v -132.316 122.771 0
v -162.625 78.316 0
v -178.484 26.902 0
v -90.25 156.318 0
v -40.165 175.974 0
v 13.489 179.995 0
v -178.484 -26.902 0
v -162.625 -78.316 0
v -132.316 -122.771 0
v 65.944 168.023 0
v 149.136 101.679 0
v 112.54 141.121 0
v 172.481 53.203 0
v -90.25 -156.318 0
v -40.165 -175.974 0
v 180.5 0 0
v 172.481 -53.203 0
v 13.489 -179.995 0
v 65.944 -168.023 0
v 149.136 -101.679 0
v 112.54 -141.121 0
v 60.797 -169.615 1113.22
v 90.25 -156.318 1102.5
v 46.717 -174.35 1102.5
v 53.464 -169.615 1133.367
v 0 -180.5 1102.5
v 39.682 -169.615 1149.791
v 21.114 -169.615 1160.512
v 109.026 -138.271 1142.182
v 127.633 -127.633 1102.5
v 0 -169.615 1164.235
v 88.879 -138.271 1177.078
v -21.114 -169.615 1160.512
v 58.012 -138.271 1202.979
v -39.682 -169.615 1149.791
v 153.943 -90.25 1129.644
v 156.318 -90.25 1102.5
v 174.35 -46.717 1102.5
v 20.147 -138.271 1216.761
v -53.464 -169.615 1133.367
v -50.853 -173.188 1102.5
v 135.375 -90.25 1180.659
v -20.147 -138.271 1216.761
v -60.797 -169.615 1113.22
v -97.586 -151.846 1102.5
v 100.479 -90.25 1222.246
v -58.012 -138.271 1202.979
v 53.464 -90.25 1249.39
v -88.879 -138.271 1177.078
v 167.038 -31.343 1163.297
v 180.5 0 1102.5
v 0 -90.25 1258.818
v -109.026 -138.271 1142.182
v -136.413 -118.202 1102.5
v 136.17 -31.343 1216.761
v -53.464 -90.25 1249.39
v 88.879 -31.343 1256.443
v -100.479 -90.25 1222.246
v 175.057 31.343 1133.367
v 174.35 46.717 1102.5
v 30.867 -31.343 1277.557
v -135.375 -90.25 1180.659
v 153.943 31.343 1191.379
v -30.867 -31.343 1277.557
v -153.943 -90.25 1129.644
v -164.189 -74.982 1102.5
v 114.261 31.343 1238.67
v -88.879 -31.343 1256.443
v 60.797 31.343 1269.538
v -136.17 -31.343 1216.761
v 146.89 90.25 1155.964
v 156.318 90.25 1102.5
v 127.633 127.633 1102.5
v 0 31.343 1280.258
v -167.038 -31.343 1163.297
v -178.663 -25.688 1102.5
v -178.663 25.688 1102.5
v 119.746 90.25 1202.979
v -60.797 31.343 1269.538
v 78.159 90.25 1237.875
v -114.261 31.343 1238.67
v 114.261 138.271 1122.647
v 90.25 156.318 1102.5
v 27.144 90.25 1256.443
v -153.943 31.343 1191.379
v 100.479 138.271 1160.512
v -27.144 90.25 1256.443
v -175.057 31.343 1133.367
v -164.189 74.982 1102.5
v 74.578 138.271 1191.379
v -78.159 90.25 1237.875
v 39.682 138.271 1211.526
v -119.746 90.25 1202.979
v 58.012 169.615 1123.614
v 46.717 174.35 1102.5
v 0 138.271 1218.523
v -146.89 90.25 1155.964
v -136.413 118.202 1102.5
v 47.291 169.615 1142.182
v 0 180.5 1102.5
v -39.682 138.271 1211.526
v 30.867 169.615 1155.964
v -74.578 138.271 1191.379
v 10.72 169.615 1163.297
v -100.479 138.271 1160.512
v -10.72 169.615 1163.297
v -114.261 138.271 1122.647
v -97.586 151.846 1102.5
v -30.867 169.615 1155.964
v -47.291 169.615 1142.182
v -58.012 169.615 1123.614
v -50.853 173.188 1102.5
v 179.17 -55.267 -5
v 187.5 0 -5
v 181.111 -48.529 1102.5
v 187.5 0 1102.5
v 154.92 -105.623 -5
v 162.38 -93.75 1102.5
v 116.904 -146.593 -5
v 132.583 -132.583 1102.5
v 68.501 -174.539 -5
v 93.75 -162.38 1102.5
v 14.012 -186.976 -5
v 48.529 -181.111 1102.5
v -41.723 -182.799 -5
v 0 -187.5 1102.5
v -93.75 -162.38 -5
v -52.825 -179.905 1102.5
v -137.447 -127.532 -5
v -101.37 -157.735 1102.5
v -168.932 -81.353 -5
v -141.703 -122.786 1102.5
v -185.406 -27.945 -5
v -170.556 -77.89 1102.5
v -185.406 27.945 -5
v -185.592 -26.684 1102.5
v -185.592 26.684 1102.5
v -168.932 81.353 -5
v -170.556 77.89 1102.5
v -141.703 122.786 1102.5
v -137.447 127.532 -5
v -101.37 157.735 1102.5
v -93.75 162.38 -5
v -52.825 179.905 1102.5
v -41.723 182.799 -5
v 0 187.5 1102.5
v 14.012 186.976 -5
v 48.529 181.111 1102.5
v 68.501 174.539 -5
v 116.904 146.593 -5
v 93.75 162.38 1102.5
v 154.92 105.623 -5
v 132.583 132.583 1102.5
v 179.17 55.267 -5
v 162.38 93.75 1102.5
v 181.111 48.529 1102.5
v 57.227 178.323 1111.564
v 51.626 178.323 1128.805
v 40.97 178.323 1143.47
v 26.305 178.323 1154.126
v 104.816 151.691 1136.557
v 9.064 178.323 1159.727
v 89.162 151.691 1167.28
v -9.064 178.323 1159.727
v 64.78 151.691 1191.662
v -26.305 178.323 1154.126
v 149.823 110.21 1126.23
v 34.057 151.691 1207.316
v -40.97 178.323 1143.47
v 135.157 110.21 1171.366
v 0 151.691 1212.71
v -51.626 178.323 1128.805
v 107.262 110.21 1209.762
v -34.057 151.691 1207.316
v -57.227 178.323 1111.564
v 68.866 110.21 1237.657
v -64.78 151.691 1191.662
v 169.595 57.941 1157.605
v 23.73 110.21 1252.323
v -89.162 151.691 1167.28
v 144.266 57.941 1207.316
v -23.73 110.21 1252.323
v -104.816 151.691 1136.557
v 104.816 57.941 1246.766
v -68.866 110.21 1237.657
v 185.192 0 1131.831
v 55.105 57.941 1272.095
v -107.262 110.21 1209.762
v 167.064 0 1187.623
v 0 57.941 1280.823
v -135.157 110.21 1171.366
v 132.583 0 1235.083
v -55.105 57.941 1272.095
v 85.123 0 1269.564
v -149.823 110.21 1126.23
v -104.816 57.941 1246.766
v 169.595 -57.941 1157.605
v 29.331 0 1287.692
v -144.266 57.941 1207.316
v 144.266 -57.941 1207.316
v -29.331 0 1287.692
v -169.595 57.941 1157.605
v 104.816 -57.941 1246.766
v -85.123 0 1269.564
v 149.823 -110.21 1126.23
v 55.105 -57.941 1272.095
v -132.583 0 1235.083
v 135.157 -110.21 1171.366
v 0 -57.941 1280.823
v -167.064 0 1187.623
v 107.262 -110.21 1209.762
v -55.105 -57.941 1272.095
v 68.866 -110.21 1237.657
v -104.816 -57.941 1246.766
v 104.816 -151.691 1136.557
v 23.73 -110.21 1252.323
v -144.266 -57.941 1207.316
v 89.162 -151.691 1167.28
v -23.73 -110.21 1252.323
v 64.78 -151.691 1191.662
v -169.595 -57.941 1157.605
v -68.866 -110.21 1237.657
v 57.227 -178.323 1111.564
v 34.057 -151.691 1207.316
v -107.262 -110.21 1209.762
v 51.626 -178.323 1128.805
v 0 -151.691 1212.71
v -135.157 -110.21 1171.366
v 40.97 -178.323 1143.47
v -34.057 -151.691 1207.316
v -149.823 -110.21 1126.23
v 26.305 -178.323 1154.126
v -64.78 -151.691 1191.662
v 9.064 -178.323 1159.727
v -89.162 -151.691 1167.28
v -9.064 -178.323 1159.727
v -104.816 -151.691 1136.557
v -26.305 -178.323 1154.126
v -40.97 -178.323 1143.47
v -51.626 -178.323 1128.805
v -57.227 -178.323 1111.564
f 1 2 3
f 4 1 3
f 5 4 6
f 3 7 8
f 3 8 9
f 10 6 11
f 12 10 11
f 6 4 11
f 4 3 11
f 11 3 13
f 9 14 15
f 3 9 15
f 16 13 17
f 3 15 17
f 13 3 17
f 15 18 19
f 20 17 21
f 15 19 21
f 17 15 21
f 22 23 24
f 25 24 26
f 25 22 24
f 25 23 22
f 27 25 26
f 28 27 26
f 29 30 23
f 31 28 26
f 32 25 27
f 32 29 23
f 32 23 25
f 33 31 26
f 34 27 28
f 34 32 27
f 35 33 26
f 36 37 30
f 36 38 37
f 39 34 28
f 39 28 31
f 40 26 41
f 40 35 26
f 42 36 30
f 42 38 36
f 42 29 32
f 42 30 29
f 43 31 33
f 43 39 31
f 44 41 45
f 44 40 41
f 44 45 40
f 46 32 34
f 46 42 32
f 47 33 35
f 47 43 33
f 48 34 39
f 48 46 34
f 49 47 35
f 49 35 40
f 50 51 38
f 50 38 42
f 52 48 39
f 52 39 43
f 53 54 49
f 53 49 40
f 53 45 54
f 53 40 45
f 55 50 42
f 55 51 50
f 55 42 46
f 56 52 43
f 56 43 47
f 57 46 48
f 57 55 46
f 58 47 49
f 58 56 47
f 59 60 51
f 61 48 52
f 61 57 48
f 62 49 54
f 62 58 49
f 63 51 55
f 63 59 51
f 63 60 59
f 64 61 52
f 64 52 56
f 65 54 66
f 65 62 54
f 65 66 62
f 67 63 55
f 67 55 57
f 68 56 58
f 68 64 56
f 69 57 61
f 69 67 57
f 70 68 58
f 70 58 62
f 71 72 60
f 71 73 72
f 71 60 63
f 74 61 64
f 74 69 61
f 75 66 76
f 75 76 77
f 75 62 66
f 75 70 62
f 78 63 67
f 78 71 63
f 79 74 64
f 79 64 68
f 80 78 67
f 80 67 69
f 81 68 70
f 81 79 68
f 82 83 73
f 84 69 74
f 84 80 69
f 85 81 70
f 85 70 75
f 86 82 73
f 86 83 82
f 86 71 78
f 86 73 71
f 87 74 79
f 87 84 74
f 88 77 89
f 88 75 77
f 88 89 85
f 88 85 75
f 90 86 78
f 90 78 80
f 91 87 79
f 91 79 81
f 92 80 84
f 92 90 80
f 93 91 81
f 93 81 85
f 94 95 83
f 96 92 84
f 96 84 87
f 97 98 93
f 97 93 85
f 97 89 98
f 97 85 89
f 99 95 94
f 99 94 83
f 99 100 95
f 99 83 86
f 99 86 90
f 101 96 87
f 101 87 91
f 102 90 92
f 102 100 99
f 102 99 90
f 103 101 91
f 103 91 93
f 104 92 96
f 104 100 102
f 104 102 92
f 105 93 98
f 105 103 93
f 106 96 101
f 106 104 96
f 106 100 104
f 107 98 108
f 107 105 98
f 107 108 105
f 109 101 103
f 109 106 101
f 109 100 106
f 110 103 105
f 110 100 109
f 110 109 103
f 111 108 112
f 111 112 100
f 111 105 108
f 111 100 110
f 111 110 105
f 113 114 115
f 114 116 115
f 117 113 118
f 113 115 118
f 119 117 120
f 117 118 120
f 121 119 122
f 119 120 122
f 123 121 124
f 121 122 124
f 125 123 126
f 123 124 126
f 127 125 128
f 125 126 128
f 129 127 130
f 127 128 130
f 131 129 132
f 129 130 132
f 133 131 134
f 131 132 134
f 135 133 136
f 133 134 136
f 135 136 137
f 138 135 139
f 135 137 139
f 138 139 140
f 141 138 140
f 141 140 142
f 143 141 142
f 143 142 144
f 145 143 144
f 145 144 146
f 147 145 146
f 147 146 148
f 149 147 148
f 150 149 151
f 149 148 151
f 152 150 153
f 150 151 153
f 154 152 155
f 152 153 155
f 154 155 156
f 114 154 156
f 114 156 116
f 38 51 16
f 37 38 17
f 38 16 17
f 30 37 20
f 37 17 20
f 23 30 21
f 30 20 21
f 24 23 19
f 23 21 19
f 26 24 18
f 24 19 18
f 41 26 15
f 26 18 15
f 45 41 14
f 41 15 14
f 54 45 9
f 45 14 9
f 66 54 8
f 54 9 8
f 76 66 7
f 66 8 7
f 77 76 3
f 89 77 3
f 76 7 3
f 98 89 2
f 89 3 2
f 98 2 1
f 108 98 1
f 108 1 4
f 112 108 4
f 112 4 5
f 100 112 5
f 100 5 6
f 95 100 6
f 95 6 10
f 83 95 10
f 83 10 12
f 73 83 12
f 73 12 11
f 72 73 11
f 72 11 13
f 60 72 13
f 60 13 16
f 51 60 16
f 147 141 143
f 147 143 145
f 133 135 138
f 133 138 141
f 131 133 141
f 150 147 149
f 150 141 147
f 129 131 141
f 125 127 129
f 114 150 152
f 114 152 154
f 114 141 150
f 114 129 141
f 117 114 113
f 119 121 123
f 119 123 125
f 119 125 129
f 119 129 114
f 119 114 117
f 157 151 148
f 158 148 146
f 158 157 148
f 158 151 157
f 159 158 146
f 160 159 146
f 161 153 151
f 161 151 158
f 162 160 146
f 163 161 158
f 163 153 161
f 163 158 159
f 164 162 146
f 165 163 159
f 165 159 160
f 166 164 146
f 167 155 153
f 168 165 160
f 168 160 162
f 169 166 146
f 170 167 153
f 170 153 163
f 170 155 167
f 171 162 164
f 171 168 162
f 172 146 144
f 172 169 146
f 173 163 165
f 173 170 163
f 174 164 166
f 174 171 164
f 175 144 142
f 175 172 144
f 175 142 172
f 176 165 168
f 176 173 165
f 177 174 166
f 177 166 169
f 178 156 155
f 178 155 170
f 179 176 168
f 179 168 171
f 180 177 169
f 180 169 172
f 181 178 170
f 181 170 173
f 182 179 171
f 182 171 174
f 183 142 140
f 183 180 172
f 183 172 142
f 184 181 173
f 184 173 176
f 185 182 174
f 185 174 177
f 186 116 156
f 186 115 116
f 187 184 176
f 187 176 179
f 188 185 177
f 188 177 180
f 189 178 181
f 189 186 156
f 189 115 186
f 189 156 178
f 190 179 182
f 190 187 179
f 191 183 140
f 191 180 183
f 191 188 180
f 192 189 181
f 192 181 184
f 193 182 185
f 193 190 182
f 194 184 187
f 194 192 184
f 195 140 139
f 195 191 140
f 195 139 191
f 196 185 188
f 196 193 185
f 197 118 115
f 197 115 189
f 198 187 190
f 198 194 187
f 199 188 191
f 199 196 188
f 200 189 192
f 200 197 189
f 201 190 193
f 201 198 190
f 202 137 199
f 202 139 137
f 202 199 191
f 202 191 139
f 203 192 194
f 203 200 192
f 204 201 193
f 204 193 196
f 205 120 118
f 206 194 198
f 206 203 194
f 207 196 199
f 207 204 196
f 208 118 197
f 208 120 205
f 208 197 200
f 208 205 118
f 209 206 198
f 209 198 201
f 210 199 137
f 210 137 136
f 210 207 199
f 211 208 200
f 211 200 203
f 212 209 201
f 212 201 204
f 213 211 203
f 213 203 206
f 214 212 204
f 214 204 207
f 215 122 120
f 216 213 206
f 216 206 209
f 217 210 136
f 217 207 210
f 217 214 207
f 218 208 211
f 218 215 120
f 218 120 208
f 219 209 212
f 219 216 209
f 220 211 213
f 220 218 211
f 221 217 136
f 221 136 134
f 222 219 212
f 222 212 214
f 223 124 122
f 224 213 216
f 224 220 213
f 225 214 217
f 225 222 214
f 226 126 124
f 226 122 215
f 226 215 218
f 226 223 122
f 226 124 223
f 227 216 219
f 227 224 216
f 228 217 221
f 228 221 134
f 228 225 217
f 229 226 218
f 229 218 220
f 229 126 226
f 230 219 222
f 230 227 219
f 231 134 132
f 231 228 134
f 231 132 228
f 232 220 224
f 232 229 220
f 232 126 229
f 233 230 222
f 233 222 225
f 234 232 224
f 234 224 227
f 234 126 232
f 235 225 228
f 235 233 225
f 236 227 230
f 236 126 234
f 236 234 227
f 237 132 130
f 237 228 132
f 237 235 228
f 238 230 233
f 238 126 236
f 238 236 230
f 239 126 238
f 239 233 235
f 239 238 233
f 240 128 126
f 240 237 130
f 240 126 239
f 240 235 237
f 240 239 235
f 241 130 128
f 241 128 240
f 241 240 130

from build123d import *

# Parameters (mm, degrees)
F0_R     = 187.5
F1_DEPTH = 1102.5
F4_R     = 180.5
F5_DEPTH = 1102.5
F6_R     = 187.5
F6_R_2   = 180.5
F7_DEPTH = 5


with BuildPart() as f1:
    # F0 (on Top) → F1 (new body)
    with BuildSketch(Plane.XY):
        Circle(F0_R)
    extrude(amount=F1_DEPTH)

    # F2 (on face) → F3 (revolve)
    with BuildSketch(Plane.XY.offset(1102.5)):
        with BuildLine():
            Line((0, 180.5), (0, 187.5))
            ThreePointArc((0, 187.5), (-187.5, 0), (0, -187.5))
            Line((0, -187.5), (0, -180.5))
            ThreePointArc((0, -180.5), (-180.5, 0), (0, 180.5))
        make_face()
    revolve(axis=Axis((0, -93.75, 1102.5), (0, -1, 0)))

    # F4 (on face) → F5 (cut)
    with BuildSketch(Plane(origin=(0, 0, 0), x_dir=(1, 0, 0), z_dir=(0, 0, -1))):
        Circle(F4_R)
    extrude(amount=-F5_DEPTH, mode=Mode.SUBTRACT)

    # F6 (on face) → F7 (join)
    with BuildSketch(Plane(origin=(0, 0, 0), x_dir=(1, 0, 0), z_dir=(0, 0, -1))):
        Circle(F6_R)
        Circle(F6_R_2)
    extrude(amount=F7_DEPTH)


solid = f1.part
